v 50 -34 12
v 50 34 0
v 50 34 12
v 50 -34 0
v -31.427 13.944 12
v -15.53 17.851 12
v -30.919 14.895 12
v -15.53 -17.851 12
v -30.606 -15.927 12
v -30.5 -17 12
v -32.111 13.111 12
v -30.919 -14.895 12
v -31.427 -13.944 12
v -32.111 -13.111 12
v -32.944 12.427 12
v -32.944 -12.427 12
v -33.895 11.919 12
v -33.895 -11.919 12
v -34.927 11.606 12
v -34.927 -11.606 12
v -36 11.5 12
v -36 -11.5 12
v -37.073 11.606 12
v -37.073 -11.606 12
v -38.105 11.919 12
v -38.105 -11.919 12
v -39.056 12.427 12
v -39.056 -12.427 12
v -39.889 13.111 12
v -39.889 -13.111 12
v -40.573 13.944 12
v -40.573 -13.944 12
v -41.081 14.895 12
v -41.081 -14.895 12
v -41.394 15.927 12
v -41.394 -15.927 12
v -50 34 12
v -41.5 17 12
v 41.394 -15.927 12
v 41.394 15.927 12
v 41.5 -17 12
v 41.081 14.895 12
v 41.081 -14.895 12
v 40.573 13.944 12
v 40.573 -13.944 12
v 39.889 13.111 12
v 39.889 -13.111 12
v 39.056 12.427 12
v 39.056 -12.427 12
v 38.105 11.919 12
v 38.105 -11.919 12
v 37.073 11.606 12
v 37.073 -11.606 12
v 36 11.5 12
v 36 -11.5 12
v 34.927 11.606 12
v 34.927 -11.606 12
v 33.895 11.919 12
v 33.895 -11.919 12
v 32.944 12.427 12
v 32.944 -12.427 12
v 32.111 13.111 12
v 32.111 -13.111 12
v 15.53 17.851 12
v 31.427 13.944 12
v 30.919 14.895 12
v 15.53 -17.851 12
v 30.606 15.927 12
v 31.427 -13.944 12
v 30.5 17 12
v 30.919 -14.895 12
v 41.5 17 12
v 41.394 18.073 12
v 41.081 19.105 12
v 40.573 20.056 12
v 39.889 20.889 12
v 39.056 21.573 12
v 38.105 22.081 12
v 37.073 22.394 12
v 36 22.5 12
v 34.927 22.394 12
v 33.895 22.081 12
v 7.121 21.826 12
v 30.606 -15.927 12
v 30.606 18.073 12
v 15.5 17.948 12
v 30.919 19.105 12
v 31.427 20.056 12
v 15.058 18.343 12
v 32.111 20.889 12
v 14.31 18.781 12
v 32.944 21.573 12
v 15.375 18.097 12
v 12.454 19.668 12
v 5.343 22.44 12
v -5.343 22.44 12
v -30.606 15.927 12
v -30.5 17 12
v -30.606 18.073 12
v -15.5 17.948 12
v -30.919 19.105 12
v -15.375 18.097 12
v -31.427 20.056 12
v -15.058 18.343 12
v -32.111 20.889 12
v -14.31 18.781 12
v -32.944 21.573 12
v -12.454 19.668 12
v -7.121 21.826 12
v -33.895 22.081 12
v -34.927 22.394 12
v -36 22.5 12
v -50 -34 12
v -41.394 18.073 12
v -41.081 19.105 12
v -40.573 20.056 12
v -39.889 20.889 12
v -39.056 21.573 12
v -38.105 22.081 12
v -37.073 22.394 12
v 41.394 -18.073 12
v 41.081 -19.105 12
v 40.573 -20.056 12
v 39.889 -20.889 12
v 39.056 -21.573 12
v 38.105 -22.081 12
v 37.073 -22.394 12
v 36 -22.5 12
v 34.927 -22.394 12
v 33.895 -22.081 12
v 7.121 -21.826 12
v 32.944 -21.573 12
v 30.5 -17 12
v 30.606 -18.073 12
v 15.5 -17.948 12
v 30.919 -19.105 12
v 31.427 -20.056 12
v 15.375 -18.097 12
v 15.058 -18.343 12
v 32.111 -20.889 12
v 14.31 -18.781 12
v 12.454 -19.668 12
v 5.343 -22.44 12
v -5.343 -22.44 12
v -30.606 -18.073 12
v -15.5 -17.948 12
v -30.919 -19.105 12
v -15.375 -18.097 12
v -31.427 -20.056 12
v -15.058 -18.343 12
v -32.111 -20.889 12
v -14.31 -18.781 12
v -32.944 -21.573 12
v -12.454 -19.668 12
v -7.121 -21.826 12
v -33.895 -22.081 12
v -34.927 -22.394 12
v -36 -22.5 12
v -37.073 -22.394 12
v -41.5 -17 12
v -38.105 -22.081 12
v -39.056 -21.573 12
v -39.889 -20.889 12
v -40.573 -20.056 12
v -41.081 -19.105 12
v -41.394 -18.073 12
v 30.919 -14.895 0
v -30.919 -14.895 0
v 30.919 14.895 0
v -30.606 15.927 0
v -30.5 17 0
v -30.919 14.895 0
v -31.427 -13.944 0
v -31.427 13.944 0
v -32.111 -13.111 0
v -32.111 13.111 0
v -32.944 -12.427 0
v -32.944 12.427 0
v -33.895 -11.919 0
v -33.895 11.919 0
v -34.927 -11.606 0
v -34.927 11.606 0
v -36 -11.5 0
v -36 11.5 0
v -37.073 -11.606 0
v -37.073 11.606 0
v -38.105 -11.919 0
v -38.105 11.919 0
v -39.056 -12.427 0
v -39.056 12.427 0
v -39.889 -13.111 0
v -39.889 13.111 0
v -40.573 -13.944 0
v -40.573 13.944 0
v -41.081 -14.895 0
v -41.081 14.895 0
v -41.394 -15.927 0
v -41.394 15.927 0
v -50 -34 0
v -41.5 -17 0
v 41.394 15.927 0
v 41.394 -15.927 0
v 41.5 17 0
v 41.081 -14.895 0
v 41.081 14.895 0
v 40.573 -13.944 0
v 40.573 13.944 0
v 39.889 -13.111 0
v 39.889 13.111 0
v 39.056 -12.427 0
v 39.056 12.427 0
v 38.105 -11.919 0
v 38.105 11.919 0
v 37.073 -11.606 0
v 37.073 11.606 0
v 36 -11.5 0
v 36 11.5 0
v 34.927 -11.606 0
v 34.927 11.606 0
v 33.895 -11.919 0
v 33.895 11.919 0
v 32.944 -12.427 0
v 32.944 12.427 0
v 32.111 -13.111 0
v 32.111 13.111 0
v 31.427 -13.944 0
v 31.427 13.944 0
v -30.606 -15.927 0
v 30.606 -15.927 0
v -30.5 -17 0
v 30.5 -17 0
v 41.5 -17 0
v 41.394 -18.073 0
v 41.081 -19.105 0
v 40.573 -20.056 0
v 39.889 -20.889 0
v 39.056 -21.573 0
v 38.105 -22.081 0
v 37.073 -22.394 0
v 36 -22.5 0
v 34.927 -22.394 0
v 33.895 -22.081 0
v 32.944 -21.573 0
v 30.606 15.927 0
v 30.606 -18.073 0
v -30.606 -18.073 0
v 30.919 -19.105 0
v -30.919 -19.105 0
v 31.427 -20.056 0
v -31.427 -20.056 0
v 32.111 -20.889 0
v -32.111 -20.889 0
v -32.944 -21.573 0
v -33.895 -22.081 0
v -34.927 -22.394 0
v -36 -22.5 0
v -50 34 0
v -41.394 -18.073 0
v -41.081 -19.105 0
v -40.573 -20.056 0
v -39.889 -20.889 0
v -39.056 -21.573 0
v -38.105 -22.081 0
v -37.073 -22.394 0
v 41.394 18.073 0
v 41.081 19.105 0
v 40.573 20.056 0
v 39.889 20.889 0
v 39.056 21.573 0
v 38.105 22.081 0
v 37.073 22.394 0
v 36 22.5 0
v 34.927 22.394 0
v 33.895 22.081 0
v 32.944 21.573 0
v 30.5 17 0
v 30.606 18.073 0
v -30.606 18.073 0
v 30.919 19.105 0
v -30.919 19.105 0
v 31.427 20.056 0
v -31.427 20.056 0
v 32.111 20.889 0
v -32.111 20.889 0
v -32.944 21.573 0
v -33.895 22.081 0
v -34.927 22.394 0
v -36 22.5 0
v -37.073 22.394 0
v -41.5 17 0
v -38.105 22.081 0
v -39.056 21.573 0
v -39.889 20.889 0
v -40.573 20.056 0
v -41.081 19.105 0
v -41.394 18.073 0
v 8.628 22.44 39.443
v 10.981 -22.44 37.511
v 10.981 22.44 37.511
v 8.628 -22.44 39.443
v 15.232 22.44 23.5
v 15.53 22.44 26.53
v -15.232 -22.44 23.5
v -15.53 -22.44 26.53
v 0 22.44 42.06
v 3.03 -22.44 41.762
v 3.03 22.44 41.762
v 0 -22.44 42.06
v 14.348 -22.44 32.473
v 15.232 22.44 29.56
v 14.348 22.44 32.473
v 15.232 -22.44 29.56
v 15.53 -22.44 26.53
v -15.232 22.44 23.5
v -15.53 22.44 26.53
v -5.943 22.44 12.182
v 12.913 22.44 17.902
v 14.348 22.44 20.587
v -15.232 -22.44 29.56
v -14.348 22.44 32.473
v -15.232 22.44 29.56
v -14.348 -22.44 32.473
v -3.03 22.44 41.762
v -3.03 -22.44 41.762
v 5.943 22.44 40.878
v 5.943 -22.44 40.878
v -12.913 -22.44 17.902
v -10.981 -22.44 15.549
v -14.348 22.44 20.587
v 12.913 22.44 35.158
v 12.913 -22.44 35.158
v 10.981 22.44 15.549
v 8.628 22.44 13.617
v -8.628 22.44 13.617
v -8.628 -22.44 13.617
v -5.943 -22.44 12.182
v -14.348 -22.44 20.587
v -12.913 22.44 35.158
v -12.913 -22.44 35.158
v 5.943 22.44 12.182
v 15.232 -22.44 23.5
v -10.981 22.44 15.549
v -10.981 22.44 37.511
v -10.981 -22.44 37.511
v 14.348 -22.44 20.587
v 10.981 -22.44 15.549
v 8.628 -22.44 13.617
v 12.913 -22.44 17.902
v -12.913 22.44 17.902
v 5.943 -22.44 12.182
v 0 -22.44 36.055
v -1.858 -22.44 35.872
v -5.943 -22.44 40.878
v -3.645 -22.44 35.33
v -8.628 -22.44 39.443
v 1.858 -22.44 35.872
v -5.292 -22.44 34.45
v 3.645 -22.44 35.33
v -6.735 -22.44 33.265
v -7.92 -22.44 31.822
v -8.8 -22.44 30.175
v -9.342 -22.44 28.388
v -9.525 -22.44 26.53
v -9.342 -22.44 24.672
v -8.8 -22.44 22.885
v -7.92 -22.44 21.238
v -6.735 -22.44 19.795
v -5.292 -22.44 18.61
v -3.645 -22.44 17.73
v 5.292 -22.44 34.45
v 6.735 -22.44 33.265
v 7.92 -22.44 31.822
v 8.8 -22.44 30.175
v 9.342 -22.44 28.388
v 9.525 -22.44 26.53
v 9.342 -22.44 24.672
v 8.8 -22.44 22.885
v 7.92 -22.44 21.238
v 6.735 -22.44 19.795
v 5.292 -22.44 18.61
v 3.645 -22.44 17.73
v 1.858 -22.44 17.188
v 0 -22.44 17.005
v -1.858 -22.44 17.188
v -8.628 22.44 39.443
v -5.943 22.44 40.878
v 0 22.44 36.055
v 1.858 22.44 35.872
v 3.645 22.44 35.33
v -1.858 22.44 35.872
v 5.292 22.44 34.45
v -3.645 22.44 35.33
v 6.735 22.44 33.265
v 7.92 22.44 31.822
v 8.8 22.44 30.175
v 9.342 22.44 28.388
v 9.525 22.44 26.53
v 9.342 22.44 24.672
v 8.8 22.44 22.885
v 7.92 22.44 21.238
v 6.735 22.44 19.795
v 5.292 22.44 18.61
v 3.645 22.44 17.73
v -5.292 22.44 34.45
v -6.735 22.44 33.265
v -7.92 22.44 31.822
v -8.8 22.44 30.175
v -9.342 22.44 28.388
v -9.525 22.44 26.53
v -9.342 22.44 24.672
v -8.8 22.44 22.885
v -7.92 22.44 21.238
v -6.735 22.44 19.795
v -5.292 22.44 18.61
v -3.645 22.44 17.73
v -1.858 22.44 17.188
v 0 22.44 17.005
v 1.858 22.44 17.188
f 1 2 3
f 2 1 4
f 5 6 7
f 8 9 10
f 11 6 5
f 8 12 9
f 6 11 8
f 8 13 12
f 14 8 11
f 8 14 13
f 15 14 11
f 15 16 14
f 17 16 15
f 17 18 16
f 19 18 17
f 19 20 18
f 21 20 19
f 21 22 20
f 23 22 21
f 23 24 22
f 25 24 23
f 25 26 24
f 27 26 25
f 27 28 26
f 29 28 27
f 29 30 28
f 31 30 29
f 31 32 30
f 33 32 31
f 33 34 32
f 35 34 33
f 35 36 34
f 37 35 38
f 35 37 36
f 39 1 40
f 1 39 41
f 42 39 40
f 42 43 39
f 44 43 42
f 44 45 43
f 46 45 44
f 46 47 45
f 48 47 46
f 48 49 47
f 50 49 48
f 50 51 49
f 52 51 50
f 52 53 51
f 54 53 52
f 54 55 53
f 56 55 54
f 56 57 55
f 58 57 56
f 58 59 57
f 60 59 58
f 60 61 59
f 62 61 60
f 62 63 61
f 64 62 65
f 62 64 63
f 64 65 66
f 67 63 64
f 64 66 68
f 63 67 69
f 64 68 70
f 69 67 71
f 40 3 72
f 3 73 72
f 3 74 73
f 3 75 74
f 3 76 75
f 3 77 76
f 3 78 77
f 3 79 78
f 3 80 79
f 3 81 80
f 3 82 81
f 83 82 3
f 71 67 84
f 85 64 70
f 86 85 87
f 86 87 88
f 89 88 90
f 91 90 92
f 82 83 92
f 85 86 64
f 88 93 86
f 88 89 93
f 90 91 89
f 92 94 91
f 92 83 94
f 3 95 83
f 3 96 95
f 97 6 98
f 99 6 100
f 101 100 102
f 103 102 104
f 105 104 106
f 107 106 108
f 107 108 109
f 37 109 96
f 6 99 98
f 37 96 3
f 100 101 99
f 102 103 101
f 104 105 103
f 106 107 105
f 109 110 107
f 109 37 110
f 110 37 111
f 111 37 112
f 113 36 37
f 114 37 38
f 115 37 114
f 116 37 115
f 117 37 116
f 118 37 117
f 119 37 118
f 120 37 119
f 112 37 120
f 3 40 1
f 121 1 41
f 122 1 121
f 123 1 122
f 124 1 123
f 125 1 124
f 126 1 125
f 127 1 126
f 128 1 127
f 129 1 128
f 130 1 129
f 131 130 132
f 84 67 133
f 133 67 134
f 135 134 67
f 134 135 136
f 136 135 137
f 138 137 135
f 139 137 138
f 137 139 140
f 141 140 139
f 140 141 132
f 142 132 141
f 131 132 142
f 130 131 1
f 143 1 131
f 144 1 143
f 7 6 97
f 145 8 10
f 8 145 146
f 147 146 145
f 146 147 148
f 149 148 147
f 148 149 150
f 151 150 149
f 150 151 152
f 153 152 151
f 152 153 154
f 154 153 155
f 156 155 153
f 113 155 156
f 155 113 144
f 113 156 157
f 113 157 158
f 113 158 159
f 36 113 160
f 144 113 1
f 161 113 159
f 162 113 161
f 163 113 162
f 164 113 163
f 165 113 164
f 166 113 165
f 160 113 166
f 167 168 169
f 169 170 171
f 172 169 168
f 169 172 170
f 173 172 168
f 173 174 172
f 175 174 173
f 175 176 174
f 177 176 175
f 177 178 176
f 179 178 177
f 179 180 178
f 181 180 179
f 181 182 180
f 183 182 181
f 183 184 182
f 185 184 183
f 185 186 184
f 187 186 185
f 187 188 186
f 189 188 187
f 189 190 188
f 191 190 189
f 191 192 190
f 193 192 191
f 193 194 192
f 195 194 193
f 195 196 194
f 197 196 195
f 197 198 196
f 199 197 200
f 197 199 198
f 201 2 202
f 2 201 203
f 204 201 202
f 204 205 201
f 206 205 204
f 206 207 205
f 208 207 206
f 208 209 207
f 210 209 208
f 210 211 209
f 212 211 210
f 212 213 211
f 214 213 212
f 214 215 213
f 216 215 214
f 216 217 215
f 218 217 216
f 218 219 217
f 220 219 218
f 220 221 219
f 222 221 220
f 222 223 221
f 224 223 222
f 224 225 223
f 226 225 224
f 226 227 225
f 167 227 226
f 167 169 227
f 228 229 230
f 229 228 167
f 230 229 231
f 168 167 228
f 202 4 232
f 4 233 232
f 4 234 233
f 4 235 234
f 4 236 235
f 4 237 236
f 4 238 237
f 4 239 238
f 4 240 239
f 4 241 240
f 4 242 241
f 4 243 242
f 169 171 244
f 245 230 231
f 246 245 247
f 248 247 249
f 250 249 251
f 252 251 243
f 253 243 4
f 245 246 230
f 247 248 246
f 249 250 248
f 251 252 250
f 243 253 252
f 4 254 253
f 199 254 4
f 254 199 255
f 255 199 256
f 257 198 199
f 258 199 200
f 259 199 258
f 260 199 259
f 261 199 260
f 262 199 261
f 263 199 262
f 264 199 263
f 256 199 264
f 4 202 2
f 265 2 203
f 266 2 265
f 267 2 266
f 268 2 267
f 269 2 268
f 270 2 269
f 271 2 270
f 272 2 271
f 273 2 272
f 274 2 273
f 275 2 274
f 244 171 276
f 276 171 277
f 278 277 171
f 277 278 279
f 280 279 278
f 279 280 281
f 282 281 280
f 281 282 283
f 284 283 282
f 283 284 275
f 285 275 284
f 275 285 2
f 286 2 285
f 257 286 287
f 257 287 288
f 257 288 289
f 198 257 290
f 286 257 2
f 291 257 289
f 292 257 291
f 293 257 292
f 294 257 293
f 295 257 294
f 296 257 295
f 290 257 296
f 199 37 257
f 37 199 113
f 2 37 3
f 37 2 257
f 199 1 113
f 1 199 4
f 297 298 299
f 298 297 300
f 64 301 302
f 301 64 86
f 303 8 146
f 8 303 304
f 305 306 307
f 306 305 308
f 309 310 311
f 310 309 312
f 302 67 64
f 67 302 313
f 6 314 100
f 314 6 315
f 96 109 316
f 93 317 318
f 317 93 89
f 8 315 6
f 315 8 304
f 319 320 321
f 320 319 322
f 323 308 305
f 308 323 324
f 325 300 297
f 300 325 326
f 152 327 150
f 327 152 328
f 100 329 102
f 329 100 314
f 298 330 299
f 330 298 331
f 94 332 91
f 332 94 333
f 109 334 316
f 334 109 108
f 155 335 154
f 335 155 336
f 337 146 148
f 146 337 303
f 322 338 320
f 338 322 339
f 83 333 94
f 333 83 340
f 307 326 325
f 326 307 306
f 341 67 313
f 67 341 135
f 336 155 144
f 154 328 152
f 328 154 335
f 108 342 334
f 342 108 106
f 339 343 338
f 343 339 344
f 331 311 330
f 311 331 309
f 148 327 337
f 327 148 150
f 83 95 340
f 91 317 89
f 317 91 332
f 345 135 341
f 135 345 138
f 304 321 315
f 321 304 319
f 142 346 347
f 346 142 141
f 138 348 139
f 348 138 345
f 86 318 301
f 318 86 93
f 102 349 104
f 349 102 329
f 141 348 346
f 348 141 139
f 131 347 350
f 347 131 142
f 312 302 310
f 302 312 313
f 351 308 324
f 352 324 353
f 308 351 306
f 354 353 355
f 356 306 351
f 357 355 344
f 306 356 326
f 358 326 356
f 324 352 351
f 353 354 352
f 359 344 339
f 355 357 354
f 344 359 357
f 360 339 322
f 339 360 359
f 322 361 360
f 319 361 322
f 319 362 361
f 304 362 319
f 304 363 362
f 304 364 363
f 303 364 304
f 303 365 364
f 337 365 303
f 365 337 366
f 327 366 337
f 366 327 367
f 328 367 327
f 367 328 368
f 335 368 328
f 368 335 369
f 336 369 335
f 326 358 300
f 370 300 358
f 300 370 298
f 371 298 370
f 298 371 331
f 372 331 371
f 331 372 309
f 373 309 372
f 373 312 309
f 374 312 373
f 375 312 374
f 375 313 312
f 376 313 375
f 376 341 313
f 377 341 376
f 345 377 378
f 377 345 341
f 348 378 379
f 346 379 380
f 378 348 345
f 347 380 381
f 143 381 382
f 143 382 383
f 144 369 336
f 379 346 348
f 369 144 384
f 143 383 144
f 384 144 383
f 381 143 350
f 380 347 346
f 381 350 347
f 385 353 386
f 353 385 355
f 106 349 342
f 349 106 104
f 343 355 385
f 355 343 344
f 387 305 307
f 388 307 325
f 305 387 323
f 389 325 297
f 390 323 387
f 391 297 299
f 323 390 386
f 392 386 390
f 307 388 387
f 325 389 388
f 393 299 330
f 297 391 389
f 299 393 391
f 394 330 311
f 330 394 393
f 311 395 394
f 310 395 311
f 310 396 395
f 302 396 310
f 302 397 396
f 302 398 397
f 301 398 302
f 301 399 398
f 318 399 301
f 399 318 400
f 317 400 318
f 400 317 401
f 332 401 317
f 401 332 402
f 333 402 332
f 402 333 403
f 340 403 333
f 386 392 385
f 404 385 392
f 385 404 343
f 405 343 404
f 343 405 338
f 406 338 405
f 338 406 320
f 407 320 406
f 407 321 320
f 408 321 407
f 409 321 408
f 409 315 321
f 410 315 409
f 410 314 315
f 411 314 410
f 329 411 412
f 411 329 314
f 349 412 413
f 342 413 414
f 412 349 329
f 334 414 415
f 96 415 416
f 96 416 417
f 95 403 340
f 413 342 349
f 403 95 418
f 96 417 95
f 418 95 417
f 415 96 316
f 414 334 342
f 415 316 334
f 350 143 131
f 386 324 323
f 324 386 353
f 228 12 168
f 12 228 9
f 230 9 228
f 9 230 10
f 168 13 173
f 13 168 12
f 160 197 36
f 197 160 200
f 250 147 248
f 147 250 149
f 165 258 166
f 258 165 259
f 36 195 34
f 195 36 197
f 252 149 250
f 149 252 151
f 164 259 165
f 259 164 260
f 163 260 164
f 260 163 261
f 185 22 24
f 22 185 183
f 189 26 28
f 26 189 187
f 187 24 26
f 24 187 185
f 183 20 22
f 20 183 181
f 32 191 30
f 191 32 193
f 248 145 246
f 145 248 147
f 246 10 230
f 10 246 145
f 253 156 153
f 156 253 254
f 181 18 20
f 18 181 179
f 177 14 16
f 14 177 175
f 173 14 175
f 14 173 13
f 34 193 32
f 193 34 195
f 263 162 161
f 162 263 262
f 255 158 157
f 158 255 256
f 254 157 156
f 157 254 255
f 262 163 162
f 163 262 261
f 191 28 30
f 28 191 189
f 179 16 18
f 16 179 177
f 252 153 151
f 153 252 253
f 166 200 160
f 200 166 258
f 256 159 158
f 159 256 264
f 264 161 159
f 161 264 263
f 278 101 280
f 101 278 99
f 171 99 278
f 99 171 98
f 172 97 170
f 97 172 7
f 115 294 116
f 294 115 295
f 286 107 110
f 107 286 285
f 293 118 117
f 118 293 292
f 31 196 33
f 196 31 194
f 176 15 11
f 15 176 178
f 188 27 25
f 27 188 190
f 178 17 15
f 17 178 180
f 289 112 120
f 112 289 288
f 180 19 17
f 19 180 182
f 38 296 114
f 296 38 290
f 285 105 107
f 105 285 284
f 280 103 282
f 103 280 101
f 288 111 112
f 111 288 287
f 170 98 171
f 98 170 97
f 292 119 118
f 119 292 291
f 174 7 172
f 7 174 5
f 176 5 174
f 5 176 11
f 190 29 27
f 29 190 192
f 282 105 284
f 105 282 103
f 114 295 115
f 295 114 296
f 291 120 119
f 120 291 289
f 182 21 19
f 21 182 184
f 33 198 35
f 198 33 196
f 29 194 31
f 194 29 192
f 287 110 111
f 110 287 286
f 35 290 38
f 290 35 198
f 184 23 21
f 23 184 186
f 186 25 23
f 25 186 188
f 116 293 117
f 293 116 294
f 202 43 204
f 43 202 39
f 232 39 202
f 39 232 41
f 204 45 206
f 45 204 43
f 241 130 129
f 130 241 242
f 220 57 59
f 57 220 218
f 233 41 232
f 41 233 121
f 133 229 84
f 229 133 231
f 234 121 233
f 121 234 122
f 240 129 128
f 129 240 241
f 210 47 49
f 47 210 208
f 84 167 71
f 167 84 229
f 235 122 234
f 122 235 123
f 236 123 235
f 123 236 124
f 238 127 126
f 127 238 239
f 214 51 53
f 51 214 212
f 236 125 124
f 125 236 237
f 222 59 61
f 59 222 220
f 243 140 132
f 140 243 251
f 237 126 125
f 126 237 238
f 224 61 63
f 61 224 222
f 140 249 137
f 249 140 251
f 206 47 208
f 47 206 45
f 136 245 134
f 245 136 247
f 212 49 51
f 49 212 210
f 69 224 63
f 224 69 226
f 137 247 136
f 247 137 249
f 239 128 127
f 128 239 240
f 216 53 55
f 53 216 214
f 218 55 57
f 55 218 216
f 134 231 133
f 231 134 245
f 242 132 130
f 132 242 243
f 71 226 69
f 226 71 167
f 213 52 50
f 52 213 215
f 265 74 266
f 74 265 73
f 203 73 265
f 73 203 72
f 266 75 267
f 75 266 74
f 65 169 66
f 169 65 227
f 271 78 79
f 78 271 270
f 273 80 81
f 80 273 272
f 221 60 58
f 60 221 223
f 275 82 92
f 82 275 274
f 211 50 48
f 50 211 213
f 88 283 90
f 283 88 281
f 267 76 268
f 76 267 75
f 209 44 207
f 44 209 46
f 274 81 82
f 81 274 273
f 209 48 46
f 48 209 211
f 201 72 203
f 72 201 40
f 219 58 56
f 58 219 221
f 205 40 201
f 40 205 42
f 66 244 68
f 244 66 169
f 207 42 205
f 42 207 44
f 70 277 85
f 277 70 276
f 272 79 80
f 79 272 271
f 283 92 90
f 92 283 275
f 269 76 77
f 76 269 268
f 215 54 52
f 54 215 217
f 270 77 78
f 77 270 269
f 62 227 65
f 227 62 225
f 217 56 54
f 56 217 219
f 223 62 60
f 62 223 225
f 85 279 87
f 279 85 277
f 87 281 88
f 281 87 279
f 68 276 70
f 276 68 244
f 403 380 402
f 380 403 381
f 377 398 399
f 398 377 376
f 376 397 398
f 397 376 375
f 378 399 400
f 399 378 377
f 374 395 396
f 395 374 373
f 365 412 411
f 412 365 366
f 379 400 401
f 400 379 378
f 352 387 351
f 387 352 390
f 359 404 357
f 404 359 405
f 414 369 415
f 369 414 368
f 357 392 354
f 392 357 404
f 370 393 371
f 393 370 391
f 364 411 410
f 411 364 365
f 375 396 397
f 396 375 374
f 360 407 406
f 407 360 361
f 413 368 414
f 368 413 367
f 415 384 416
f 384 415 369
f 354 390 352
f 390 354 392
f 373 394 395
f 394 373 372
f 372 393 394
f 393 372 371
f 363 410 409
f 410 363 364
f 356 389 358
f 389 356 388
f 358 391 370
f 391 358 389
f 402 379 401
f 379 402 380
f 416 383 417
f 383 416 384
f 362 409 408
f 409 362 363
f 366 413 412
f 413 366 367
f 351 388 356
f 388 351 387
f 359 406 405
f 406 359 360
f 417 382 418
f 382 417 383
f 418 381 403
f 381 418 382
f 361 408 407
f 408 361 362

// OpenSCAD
$fn = 32;

// ----------------------------------------------------------------------
// Bearing block: 100 x 68 mm base, 19.05 mm bore at 26.53 mm
// ----------------------------------------------------------------------

// --- parameters (mm) ---
base_w = 100;             // base width
base_d = 68;              // base depth
base_t = 12;              // base thickness
bore_d = 19.05;           // shaft / bearing bore
house_r = 15.53;          // housing outer radius
house_len = 44.88;        // housing length along the shaft
foot_w = 31.06;           // foot width under the housing
foot_len = 34.88;         // foot length along the shaft
axis_z = 26.53;           // bore axis height above the base
holes_d = 11;             // mounting holes
hole_x = 36;              // mounting hole spacing

difference() {
  union() {
    /* base plate with its underside on z = 0 */
    translate([0, 0, base_t / 2]) cube([base_w, base_d, base_t], center = true);
    /* hull foot: a straight web blending into the round housing */
    hull() {
      translate([0, 0, base_t - 0.5]) cube([foot_w, foot_len, 1.6], center = true);
      translate([0, 0, axis_z]) rotate([-90, 0, 0]) cylinder(h = house_len, d = 2 * house_r, center = true);
    }
  }
  /* bore through the housing, 2.5 mm clear on both sides */
  translate([0, 0, axis_z]) rotate([-90, 0, 0]) cylinder(h = house_len + 5, d = bore_d, center = true);
  /* mounting holes through the base plate */
  for (hx = [-36, 36]) {
    for (hy = [-17, 17]) {
      translate([hx, hy, -2.5]) cylinder(h = base_t + 5, d = holes_d);
    }
  }
}
